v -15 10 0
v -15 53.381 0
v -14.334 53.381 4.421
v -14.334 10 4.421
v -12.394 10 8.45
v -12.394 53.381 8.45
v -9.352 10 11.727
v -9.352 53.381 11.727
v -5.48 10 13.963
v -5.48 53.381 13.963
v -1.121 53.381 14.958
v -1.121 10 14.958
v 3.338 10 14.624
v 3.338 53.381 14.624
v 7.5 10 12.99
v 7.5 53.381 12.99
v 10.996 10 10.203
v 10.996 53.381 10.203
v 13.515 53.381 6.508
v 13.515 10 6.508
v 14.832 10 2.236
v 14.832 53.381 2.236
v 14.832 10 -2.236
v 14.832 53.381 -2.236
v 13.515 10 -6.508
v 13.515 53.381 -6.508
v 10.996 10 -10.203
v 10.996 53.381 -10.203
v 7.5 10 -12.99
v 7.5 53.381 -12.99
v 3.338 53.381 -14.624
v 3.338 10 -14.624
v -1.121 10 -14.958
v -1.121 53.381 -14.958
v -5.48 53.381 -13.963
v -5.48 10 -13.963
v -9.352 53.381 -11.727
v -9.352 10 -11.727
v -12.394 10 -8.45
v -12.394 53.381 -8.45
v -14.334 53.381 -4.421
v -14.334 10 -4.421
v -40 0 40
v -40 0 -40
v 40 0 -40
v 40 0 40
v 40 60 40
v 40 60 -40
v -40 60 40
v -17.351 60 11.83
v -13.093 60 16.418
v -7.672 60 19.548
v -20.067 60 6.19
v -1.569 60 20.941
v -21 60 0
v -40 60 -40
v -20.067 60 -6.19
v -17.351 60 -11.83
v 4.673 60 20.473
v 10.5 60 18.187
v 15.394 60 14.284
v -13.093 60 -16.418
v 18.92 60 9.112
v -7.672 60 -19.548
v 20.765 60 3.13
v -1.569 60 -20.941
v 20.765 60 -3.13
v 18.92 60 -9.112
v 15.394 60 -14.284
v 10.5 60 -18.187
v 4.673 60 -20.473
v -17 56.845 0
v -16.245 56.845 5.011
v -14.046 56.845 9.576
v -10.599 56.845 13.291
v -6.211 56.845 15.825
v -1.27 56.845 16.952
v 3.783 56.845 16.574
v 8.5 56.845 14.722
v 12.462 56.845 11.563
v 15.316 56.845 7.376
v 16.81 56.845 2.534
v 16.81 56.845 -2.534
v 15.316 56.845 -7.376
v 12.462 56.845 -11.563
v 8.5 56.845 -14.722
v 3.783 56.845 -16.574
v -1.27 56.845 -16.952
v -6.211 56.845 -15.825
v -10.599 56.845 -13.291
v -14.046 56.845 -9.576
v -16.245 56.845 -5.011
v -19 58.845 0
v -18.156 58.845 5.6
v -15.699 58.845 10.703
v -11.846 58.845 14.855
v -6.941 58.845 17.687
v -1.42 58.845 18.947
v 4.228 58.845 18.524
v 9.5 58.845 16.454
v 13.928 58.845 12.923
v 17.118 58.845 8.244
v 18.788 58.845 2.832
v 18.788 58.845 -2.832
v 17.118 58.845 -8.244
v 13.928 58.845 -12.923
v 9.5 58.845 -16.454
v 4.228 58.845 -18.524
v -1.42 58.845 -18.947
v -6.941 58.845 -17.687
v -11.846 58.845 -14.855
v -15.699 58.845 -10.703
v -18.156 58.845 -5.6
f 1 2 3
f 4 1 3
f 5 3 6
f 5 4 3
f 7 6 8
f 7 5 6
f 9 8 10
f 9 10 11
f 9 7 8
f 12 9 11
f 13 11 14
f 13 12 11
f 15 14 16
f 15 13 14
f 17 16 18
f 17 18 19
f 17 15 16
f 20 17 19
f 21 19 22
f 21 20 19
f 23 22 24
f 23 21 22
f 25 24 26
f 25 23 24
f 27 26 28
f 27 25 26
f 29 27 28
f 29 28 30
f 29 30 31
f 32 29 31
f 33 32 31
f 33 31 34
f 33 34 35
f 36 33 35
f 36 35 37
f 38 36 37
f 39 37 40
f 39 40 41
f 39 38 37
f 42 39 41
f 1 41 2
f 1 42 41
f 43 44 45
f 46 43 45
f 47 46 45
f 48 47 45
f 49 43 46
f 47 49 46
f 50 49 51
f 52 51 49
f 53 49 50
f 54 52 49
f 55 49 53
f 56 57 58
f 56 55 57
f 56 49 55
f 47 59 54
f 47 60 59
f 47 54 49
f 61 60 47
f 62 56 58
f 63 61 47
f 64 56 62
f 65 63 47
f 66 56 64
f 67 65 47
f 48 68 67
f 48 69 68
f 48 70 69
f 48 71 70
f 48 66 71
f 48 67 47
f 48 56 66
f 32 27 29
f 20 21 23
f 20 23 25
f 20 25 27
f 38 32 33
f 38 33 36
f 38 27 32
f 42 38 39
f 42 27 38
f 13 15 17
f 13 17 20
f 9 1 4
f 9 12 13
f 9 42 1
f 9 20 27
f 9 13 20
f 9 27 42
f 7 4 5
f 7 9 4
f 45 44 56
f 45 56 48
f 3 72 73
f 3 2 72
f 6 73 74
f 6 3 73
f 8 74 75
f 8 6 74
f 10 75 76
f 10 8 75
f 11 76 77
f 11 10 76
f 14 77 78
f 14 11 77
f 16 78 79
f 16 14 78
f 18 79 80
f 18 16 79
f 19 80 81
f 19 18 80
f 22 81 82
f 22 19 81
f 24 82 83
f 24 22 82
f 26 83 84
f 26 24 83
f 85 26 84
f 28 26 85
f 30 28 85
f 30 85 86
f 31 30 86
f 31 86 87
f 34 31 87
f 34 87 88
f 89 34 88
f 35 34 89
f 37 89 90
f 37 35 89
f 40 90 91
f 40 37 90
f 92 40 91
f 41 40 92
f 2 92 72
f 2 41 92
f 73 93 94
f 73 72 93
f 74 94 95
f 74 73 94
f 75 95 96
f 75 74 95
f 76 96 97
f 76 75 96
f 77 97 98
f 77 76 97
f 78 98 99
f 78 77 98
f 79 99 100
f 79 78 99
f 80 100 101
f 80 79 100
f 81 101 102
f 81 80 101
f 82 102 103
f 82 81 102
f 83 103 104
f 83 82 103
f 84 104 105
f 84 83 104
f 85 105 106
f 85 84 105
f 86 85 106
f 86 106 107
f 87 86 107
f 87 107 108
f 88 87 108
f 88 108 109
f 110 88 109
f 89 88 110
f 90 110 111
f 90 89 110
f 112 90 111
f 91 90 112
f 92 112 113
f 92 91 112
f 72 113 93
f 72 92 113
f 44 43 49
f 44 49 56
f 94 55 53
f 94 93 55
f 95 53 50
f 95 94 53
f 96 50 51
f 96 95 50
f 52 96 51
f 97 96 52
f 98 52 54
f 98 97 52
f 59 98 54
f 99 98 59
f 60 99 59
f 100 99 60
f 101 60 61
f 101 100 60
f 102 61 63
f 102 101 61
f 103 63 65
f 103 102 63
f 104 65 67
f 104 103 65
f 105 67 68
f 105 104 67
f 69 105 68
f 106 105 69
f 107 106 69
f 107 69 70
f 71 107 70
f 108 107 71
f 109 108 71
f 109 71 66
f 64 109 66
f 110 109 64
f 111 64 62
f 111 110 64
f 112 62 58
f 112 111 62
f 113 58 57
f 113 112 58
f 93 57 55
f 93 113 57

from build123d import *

# Parameters (mm, degrees)
SKETCH1_W           = 80
SKETCH1_H           = 80
BOSS_EXTRUDE1_DEPTH = 60


with BuildPart() as part:
    # Sketch1 → Boss-Extrude1 (new body)
    with BuildSketch(Plane(origin=(0, 0, 0), x_dir=(1, 0, 0), z_dir=(0, 1, 0))):
        Rectangle(SKETCH1_W, SKETCH1_H)
    extrude(amount=BOSS_EXTRUDE1_DEPTH)

    # Sketch2 → Cut-Revolve1 (revolve, cut)
    with BuildSketch(Plane.XY):
        Polygon((0, 60), (-21, 60), (-19, 58.845299462), (-17, 56.845299462), (-15, 53.381197846), (-15, 10), (0, 10), align=None)
    revolve(axis=Axis((0, 10, 0), (0, 1, 0)), mode=Mode.SUBTRACT)


solid = part.part
